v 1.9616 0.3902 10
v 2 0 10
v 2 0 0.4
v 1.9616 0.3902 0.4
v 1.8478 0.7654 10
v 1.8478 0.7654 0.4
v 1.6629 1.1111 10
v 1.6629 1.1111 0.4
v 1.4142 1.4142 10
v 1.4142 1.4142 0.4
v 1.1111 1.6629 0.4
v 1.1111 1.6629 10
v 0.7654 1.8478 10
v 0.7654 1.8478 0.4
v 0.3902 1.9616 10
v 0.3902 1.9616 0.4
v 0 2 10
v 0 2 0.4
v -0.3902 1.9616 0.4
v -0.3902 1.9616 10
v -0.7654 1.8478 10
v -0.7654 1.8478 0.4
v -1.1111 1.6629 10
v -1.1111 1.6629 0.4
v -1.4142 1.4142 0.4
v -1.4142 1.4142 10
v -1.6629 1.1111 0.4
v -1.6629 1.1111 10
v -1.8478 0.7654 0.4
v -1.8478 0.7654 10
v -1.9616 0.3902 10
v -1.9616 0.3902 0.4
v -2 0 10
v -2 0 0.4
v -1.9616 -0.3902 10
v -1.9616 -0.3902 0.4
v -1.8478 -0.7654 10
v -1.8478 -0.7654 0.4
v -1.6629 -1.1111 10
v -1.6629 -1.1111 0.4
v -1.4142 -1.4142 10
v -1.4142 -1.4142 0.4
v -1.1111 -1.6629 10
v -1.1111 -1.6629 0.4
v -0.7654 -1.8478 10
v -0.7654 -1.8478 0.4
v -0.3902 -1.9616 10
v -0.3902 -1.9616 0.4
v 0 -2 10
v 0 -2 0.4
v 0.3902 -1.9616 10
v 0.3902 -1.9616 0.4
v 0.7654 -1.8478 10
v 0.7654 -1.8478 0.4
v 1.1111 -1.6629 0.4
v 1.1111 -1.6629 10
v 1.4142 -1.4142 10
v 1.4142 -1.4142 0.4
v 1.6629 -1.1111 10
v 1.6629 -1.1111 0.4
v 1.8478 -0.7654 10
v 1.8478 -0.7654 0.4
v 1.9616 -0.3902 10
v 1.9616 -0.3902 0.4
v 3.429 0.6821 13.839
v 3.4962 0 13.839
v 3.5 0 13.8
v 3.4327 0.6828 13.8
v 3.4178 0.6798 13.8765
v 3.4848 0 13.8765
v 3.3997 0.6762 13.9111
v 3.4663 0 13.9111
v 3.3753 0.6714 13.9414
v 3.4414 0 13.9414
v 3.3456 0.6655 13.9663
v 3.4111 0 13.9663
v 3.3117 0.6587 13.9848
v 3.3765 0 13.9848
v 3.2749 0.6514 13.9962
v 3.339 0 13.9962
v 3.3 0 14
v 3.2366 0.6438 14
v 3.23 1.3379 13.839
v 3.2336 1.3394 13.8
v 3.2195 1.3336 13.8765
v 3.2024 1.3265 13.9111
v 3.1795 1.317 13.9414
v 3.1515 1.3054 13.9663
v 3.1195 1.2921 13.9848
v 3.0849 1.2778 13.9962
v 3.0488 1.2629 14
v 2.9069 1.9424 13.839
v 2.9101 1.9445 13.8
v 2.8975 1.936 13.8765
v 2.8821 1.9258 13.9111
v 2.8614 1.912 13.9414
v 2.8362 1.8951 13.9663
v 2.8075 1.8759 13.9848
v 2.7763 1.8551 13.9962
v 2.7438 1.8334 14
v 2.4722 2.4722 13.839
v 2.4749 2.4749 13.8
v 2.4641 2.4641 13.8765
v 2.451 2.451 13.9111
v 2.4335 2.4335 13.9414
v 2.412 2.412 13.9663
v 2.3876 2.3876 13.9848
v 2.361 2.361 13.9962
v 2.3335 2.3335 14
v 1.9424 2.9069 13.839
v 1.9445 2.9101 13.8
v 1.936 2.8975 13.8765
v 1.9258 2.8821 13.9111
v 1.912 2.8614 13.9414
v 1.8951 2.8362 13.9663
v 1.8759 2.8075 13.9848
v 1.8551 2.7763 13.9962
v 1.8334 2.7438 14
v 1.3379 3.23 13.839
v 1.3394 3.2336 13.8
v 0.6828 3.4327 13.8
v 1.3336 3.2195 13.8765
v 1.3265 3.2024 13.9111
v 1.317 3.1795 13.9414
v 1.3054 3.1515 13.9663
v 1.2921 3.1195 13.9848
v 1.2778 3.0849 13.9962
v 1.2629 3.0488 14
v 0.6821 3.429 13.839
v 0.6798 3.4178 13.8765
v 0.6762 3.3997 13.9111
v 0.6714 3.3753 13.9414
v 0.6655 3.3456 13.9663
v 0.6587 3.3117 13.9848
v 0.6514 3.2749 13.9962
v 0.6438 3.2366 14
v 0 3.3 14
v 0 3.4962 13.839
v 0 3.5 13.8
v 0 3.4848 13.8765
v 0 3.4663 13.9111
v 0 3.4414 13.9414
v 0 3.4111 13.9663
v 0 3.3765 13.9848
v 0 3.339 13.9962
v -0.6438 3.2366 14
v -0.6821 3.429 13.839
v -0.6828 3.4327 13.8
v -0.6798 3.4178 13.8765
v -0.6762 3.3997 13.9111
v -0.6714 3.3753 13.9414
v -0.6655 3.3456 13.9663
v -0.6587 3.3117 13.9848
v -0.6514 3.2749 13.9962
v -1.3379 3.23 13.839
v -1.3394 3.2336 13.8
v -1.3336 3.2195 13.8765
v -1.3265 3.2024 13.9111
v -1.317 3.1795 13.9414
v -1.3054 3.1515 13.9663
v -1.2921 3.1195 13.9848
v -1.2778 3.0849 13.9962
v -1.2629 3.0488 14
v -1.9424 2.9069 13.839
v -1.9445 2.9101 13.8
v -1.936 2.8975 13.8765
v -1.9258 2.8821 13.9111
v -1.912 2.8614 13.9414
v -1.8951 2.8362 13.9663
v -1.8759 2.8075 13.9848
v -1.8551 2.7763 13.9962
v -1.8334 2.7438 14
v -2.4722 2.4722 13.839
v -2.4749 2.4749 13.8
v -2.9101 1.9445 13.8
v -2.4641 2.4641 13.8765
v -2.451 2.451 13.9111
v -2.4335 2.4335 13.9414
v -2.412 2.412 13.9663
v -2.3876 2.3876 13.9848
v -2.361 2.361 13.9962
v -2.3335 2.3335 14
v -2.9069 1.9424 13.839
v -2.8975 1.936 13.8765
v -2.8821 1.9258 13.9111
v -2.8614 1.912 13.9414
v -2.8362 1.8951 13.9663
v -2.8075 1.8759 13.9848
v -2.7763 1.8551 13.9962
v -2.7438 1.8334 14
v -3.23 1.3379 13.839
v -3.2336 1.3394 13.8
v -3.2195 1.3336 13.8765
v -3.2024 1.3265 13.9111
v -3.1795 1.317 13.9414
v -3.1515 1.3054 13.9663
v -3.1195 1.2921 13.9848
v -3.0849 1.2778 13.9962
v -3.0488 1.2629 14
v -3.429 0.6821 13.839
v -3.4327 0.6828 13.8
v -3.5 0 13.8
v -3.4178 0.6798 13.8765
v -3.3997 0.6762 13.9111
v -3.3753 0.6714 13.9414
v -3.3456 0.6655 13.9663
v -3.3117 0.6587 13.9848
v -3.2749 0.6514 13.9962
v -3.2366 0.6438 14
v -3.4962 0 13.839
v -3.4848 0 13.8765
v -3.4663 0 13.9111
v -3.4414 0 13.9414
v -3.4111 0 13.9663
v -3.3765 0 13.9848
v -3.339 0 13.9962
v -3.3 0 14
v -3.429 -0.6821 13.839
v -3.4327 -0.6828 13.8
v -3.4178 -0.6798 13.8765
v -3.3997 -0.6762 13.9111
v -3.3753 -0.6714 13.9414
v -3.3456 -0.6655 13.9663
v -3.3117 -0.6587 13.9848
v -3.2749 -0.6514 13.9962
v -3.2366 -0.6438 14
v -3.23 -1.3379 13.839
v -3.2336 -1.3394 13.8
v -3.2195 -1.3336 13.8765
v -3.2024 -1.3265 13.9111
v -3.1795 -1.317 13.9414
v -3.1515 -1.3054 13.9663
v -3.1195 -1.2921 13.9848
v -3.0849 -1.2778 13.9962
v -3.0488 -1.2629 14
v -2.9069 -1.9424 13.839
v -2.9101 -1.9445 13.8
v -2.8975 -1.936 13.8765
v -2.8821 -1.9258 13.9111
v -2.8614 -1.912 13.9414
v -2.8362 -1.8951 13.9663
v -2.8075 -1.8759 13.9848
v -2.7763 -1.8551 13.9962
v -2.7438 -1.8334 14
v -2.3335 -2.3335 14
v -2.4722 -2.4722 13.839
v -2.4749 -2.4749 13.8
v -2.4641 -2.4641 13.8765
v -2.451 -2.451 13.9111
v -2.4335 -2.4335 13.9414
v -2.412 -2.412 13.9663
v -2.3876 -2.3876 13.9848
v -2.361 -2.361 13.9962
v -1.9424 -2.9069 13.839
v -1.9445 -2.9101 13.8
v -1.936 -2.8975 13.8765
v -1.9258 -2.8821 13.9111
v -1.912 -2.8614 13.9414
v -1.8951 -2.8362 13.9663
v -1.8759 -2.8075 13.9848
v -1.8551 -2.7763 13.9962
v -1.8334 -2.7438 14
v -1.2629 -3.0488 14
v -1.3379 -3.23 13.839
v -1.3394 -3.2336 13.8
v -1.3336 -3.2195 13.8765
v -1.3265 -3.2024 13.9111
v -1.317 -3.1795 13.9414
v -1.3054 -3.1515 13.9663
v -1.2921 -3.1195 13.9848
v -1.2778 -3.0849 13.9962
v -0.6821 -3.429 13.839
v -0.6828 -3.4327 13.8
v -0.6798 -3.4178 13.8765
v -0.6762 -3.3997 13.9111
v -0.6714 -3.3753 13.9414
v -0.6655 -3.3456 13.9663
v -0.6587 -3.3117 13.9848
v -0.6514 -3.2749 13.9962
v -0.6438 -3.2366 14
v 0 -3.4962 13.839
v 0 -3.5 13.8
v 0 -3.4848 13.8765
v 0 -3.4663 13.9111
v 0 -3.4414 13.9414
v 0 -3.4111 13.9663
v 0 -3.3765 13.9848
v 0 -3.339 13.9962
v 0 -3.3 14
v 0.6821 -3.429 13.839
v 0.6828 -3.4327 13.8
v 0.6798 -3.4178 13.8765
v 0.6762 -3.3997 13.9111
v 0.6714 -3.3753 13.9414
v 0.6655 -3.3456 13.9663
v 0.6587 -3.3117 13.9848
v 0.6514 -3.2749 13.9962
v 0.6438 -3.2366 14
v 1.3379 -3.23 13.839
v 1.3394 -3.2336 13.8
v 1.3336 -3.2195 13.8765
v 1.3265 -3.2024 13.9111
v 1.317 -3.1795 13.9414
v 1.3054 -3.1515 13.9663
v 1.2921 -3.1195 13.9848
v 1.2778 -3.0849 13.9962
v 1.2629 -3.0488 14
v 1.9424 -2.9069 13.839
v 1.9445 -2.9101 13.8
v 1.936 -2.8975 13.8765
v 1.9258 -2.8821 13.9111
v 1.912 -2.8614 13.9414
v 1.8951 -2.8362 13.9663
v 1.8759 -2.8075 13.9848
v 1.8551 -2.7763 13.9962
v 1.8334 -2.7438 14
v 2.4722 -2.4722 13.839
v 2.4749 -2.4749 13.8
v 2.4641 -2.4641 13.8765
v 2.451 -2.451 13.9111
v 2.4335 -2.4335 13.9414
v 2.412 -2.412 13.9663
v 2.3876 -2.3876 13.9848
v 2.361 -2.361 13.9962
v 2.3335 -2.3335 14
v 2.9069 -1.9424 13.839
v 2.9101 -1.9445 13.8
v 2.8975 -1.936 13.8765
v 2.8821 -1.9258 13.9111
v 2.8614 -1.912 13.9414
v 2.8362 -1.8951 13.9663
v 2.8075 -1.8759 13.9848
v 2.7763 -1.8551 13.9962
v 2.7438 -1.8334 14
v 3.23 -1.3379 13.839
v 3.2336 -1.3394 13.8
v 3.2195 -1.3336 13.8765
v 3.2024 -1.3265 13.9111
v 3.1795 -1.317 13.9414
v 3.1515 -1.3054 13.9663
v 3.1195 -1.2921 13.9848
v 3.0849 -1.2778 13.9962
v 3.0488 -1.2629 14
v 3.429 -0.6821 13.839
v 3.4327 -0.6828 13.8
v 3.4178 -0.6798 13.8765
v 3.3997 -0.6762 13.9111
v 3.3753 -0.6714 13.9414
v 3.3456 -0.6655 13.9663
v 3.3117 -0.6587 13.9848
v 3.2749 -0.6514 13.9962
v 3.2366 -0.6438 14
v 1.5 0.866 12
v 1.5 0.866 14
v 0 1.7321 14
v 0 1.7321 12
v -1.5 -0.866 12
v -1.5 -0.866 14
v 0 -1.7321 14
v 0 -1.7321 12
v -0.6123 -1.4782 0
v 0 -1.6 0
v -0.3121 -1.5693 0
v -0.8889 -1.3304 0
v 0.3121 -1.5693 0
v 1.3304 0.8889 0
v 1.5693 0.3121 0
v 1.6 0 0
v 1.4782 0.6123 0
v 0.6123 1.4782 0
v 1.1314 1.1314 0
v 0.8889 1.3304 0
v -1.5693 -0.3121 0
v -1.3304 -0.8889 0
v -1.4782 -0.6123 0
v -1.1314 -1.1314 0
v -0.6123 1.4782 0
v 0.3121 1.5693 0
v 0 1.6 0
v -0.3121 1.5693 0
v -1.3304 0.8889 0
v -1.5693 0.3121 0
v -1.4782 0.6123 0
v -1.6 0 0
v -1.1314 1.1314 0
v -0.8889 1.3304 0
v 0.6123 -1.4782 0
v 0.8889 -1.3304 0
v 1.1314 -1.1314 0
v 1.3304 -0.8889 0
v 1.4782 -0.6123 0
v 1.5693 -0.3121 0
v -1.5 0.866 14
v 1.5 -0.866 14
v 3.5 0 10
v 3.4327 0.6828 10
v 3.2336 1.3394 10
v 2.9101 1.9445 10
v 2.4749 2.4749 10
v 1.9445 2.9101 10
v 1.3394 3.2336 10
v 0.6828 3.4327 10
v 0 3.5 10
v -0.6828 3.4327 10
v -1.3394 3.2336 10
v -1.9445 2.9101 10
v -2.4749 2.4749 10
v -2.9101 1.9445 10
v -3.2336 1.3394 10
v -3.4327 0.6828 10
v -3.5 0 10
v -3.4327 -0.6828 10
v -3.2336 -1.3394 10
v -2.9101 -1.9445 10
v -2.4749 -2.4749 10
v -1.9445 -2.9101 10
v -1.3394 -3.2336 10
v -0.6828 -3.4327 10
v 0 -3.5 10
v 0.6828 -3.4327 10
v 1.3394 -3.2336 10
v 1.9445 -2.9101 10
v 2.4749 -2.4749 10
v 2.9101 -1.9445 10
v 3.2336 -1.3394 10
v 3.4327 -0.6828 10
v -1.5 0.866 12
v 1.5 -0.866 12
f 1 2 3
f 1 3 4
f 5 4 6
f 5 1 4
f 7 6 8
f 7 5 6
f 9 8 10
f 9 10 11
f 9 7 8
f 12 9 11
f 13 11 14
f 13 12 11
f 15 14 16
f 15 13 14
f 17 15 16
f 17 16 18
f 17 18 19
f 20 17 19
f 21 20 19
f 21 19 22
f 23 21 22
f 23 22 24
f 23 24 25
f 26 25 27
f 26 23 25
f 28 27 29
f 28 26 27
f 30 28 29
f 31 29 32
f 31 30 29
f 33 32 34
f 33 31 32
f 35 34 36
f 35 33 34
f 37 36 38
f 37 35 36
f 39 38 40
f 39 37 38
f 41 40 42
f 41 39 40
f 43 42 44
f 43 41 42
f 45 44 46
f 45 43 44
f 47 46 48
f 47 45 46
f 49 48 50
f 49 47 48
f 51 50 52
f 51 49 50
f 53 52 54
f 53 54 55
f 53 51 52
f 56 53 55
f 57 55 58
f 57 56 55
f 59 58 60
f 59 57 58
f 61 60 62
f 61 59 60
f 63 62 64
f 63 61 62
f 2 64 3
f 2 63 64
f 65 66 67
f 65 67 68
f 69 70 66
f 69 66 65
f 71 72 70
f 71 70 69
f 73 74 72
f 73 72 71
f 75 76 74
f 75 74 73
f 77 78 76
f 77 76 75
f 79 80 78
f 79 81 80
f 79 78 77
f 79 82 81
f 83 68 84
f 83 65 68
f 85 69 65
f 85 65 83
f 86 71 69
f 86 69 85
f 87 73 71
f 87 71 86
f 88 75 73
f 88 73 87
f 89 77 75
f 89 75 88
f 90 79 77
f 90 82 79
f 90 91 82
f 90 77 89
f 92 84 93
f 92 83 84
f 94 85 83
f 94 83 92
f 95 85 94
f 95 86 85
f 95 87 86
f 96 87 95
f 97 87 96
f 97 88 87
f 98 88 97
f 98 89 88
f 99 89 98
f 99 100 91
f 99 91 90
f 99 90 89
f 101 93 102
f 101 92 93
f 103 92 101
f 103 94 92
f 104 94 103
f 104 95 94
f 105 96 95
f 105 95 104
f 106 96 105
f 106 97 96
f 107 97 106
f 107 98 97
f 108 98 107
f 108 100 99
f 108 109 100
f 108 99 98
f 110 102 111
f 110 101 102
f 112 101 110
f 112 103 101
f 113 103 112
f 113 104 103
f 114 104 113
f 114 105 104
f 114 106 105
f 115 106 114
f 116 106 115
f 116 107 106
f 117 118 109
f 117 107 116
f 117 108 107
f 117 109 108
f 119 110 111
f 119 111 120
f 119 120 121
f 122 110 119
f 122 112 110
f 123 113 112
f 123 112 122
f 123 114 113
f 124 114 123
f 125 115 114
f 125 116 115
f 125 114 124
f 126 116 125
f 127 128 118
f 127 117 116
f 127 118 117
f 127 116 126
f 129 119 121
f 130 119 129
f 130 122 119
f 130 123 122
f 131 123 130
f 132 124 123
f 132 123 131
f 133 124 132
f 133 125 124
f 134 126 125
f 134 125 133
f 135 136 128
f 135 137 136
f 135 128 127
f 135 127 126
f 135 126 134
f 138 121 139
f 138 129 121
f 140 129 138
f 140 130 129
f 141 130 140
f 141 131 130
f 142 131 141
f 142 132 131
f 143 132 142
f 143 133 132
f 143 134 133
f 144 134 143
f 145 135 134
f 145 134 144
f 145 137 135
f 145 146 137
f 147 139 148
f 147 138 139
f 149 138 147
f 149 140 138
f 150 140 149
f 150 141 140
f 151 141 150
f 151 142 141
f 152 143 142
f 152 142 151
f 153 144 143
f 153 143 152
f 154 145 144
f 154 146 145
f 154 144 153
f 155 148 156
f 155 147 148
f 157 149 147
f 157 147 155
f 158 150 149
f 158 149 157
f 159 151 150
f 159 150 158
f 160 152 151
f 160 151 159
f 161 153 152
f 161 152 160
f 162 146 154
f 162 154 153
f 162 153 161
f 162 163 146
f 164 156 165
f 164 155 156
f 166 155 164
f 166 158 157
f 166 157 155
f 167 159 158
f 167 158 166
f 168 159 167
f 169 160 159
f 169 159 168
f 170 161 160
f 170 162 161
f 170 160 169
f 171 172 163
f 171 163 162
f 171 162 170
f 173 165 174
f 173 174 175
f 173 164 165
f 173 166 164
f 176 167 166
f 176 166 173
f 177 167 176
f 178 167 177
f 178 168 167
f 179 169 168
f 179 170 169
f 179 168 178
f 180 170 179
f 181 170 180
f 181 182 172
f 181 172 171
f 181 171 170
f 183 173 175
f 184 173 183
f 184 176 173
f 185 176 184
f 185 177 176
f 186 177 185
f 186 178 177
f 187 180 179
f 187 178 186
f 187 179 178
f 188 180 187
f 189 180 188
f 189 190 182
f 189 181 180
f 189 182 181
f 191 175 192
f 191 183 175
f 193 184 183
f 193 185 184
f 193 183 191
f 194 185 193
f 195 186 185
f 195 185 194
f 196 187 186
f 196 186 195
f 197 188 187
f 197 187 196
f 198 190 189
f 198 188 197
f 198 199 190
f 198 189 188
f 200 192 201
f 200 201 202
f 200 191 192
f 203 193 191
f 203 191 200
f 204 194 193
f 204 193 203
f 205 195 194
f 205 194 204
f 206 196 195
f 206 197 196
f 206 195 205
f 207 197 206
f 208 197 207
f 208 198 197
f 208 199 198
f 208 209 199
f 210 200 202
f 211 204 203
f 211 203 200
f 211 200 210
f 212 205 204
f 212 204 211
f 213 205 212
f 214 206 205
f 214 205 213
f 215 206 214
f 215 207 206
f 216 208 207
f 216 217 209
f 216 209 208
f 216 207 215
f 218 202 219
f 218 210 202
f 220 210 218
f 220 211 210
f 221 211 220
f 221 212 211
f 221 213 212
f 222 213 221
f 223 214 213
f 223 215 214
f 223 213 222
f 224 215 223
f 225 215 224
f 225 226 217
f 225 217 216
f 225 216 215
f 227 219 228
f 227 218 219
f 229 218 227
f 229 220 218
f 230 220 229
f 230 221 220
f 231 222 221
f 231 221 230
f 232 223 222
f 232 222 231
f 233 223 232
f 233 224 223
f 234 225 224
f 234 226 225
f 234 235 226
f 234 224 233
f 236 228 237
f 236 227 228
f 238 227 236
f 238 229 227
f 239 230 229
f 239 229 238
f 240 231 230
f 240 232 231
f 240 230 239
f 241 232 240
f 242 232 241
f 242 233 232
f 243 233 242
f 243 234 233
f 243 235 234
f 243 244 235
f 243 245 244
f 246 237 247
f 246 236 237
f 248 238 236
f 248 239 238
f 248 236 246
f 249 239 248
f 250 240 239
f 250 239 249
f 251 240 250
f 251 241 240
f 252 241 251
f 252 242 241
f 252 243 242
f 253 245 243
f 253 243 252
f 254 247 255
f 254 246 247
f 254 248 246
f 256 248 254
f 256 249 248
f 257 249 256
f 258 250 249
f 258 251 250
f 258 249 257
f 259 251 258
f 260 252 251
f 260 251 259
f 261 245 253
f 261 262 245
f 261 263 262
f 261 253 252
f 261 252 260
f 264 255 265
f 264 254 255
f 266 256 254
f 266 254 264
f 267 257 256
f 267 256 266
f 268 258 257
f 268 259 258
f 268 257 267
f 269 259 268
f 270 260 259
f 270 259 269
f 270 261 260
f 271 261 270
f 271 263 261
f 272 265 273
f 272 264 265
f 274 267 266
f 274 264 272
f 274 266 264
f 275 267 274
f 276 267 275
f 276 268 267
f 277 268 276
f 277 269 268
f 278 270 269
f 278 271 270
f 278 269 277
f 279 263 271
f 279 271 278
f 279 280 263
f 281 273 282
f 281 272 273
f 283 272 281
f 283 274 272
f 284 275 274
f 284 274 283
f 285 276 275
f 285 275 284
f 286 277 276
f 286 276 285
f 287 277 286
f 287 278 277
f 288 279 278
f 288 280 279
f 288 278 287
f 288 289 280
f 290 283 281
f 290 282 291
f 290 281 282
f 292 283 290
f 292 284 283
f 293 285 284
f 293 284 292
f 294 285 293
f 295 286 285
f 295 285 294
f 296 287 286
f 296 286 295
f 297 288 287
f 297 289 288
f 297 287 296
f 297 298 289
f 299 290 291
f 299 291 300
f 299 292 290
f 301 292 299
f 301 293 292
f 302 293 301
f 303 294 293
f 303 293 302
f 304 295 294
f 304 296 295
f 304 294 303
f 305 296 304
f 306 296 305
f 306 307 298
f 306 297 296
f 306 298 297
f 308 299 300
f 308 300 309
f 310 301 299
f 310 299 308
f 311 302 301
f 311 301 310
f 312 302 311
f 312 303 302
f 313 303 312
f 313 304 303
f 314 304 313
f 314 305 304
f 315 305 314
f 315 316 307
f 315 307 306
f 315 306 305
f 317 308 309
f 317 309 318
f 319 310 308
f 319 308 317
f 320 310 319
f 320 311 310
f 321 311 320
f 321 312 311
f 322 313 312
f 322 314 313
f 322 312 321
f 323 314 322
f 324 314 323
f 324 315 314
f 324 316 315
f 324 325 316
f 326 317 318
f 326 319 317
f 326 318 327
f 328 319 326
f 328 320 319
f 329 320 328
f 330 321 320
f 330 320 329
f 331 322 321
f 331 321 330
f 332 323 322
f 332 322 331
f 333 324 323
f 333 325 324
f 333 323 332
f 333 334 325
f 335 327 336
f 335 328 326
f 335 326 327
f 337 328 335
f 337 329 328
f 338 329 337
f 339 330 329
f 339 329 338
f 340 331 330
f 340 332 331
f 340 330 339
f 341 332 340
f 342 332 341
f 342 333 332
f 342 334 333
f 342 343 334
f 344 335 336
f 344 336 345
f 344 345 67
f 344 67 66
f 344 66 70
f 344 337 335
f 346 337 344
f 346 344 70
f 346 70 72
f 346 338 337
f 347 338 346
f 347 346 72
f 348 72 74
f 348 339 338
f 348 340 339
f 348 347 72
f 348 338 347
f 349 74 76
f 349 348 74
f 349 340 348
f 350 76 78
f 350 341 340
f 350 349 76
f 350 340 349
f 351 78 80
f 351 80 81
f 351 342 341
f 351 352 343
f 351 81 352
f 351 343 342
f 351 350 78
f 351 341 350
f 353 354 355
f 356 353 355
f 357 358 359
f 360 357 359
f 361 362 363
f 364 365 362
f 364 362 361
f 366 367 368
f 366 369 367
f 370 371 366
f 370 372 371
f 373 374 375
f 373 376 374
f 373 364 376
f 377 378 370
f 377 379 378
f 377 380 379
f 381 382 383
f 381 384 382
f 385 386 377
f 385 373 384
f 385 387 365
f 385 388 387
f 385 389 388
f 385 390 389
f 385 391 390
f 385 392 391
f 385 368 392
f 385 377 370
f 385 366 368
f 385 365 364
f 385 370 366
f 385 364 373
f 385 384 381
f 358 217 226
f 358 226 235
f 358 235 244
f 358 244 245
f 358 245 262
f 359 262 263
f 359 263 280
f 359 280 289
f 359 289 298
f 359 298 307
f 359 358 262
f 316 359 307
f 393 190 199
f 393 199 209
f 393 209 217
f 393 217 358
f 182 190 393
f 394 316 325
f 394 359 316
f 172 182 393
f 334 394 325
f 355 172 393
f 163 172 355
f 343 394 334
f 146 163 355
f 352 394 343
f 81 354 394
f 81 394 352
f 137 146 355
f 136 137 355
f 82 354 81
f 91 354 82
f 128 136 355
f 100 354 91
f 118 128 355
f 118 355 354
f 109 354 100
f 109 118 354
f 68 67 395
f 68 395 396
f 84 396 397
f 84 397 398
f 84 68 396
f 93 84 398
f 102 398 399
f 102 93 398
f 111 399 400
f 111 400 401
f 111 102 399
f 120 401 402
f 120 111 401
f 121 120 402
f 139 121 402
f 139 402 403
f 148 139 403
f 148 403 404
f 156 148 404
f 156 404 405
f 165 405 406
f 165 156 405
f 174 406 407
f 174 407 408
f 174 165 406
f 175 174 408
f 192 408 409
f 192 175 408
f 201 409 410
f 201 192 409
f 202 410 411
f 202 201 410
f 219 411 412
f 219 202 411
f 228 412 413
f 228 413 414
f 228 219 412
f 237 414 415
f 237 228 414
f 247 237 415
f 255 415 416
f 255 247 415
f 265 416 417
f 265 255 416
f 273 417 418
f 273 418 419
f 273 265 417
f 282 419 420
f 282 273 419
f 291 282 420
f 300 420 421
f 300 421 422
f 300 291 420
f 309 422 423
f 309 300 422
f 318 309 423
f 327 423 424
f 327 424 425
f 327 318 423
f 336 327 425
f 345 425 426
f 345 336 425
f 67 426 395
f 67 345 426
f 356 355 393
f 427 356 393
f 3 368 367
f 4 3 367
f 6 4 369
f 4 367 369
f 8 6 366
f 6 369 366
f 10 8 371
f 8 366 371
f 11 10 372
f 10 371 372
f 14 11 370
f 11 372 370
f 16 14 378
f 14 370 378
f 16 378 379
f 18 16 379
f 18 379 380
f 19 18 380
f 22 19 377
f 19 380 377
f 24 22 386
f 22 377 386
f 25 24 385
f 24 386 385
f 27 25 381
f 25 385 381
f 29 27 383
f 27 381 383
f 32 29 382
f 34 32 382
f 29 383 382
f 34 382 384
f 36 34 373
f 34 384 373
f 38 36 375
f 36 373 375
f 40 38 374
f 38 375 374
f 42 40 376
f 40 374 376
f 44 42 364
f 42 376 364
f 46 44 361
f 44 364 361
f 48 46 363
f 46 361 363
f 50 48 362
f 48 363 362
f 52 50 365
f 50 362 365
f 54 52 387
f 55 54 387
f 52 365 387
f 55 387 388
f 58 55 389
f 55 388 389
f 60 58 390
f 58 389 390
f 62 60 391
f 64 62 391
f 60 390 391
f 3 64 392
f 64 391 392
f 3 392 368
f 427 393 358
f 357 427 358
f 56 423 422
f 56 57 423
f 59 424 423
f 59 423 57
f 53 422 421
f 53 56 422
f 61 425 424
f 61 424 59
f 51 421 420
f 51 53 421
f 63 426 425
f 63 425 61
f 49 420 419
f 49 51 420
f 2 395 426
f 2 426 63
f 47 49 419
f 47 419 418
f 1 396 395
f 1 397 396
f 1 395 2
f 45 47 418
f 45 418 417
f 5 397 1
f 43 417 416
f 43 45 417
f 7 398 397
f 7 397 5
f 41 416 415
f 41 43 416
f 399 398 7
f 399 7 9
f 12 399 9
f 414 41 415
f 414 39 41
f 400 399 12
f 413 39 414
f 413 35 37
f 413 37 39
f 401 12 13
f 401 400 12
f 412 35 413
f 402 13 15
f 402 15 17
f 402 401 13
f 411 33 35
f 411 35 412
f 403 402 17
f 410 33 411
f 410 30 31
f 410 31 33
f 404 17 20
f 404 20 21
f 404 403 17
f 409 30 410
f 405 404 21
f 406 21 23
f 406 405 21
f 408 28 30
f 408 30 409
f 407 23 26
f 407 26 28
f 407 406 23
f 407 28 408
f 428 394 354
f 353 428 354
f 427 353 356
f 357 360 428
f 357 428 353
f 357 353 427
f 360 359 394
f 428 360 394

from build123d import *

# Parameters (mm, degrees)
CHAMFER_SIZE = 0.4
FILLET_R     = 0.2
POCKET_DEPTH = 2


with BuildPart() as part:
    # Sketch → Revolution (revolve)
    with BuildSketch(Plane.XZ):
        Polygon((2, 0), (2, 10), (3.5, 10), (3.5, 14), (0, 14), (0, 0), align=None)
    revolve(axis=Axis((0, 0, 0), (0, 0, 1)))

    # Chamfer
    chamfer_edges = [part.edges().sort_by_distance(p)[0] for p in [
        (-2, 0, 0),
    ]]
    chamfer(chamfer_edges, length=CHAMFER_SIZE)

    # Fillet
    fillet_edges = [part.edges().sort_by_distance(p)[0] for p in [
        (-3.5, 0, 14),
    ]]
    fillet(fillet_edges, radius=FILLET_R)

    # Sketch001 (on Face6 of Chamfer) → Pocket (cut)
    with BuildSketch(Plane(origin=(0, 0, 14), x_dir=(-1, 0, 0), z_dir=(0, 0, 1))):
        Polygon((1.5, 0.866025), (0, 1.732051), (-1.5, 0.866025), (-1.5, -0.866025), (0, -1.732051), (1.5, -0.866025), align=None)
    extrude(amount=-POCKET_DEPTH, mode=Mode.SUBTRACT)


solid = part.part
